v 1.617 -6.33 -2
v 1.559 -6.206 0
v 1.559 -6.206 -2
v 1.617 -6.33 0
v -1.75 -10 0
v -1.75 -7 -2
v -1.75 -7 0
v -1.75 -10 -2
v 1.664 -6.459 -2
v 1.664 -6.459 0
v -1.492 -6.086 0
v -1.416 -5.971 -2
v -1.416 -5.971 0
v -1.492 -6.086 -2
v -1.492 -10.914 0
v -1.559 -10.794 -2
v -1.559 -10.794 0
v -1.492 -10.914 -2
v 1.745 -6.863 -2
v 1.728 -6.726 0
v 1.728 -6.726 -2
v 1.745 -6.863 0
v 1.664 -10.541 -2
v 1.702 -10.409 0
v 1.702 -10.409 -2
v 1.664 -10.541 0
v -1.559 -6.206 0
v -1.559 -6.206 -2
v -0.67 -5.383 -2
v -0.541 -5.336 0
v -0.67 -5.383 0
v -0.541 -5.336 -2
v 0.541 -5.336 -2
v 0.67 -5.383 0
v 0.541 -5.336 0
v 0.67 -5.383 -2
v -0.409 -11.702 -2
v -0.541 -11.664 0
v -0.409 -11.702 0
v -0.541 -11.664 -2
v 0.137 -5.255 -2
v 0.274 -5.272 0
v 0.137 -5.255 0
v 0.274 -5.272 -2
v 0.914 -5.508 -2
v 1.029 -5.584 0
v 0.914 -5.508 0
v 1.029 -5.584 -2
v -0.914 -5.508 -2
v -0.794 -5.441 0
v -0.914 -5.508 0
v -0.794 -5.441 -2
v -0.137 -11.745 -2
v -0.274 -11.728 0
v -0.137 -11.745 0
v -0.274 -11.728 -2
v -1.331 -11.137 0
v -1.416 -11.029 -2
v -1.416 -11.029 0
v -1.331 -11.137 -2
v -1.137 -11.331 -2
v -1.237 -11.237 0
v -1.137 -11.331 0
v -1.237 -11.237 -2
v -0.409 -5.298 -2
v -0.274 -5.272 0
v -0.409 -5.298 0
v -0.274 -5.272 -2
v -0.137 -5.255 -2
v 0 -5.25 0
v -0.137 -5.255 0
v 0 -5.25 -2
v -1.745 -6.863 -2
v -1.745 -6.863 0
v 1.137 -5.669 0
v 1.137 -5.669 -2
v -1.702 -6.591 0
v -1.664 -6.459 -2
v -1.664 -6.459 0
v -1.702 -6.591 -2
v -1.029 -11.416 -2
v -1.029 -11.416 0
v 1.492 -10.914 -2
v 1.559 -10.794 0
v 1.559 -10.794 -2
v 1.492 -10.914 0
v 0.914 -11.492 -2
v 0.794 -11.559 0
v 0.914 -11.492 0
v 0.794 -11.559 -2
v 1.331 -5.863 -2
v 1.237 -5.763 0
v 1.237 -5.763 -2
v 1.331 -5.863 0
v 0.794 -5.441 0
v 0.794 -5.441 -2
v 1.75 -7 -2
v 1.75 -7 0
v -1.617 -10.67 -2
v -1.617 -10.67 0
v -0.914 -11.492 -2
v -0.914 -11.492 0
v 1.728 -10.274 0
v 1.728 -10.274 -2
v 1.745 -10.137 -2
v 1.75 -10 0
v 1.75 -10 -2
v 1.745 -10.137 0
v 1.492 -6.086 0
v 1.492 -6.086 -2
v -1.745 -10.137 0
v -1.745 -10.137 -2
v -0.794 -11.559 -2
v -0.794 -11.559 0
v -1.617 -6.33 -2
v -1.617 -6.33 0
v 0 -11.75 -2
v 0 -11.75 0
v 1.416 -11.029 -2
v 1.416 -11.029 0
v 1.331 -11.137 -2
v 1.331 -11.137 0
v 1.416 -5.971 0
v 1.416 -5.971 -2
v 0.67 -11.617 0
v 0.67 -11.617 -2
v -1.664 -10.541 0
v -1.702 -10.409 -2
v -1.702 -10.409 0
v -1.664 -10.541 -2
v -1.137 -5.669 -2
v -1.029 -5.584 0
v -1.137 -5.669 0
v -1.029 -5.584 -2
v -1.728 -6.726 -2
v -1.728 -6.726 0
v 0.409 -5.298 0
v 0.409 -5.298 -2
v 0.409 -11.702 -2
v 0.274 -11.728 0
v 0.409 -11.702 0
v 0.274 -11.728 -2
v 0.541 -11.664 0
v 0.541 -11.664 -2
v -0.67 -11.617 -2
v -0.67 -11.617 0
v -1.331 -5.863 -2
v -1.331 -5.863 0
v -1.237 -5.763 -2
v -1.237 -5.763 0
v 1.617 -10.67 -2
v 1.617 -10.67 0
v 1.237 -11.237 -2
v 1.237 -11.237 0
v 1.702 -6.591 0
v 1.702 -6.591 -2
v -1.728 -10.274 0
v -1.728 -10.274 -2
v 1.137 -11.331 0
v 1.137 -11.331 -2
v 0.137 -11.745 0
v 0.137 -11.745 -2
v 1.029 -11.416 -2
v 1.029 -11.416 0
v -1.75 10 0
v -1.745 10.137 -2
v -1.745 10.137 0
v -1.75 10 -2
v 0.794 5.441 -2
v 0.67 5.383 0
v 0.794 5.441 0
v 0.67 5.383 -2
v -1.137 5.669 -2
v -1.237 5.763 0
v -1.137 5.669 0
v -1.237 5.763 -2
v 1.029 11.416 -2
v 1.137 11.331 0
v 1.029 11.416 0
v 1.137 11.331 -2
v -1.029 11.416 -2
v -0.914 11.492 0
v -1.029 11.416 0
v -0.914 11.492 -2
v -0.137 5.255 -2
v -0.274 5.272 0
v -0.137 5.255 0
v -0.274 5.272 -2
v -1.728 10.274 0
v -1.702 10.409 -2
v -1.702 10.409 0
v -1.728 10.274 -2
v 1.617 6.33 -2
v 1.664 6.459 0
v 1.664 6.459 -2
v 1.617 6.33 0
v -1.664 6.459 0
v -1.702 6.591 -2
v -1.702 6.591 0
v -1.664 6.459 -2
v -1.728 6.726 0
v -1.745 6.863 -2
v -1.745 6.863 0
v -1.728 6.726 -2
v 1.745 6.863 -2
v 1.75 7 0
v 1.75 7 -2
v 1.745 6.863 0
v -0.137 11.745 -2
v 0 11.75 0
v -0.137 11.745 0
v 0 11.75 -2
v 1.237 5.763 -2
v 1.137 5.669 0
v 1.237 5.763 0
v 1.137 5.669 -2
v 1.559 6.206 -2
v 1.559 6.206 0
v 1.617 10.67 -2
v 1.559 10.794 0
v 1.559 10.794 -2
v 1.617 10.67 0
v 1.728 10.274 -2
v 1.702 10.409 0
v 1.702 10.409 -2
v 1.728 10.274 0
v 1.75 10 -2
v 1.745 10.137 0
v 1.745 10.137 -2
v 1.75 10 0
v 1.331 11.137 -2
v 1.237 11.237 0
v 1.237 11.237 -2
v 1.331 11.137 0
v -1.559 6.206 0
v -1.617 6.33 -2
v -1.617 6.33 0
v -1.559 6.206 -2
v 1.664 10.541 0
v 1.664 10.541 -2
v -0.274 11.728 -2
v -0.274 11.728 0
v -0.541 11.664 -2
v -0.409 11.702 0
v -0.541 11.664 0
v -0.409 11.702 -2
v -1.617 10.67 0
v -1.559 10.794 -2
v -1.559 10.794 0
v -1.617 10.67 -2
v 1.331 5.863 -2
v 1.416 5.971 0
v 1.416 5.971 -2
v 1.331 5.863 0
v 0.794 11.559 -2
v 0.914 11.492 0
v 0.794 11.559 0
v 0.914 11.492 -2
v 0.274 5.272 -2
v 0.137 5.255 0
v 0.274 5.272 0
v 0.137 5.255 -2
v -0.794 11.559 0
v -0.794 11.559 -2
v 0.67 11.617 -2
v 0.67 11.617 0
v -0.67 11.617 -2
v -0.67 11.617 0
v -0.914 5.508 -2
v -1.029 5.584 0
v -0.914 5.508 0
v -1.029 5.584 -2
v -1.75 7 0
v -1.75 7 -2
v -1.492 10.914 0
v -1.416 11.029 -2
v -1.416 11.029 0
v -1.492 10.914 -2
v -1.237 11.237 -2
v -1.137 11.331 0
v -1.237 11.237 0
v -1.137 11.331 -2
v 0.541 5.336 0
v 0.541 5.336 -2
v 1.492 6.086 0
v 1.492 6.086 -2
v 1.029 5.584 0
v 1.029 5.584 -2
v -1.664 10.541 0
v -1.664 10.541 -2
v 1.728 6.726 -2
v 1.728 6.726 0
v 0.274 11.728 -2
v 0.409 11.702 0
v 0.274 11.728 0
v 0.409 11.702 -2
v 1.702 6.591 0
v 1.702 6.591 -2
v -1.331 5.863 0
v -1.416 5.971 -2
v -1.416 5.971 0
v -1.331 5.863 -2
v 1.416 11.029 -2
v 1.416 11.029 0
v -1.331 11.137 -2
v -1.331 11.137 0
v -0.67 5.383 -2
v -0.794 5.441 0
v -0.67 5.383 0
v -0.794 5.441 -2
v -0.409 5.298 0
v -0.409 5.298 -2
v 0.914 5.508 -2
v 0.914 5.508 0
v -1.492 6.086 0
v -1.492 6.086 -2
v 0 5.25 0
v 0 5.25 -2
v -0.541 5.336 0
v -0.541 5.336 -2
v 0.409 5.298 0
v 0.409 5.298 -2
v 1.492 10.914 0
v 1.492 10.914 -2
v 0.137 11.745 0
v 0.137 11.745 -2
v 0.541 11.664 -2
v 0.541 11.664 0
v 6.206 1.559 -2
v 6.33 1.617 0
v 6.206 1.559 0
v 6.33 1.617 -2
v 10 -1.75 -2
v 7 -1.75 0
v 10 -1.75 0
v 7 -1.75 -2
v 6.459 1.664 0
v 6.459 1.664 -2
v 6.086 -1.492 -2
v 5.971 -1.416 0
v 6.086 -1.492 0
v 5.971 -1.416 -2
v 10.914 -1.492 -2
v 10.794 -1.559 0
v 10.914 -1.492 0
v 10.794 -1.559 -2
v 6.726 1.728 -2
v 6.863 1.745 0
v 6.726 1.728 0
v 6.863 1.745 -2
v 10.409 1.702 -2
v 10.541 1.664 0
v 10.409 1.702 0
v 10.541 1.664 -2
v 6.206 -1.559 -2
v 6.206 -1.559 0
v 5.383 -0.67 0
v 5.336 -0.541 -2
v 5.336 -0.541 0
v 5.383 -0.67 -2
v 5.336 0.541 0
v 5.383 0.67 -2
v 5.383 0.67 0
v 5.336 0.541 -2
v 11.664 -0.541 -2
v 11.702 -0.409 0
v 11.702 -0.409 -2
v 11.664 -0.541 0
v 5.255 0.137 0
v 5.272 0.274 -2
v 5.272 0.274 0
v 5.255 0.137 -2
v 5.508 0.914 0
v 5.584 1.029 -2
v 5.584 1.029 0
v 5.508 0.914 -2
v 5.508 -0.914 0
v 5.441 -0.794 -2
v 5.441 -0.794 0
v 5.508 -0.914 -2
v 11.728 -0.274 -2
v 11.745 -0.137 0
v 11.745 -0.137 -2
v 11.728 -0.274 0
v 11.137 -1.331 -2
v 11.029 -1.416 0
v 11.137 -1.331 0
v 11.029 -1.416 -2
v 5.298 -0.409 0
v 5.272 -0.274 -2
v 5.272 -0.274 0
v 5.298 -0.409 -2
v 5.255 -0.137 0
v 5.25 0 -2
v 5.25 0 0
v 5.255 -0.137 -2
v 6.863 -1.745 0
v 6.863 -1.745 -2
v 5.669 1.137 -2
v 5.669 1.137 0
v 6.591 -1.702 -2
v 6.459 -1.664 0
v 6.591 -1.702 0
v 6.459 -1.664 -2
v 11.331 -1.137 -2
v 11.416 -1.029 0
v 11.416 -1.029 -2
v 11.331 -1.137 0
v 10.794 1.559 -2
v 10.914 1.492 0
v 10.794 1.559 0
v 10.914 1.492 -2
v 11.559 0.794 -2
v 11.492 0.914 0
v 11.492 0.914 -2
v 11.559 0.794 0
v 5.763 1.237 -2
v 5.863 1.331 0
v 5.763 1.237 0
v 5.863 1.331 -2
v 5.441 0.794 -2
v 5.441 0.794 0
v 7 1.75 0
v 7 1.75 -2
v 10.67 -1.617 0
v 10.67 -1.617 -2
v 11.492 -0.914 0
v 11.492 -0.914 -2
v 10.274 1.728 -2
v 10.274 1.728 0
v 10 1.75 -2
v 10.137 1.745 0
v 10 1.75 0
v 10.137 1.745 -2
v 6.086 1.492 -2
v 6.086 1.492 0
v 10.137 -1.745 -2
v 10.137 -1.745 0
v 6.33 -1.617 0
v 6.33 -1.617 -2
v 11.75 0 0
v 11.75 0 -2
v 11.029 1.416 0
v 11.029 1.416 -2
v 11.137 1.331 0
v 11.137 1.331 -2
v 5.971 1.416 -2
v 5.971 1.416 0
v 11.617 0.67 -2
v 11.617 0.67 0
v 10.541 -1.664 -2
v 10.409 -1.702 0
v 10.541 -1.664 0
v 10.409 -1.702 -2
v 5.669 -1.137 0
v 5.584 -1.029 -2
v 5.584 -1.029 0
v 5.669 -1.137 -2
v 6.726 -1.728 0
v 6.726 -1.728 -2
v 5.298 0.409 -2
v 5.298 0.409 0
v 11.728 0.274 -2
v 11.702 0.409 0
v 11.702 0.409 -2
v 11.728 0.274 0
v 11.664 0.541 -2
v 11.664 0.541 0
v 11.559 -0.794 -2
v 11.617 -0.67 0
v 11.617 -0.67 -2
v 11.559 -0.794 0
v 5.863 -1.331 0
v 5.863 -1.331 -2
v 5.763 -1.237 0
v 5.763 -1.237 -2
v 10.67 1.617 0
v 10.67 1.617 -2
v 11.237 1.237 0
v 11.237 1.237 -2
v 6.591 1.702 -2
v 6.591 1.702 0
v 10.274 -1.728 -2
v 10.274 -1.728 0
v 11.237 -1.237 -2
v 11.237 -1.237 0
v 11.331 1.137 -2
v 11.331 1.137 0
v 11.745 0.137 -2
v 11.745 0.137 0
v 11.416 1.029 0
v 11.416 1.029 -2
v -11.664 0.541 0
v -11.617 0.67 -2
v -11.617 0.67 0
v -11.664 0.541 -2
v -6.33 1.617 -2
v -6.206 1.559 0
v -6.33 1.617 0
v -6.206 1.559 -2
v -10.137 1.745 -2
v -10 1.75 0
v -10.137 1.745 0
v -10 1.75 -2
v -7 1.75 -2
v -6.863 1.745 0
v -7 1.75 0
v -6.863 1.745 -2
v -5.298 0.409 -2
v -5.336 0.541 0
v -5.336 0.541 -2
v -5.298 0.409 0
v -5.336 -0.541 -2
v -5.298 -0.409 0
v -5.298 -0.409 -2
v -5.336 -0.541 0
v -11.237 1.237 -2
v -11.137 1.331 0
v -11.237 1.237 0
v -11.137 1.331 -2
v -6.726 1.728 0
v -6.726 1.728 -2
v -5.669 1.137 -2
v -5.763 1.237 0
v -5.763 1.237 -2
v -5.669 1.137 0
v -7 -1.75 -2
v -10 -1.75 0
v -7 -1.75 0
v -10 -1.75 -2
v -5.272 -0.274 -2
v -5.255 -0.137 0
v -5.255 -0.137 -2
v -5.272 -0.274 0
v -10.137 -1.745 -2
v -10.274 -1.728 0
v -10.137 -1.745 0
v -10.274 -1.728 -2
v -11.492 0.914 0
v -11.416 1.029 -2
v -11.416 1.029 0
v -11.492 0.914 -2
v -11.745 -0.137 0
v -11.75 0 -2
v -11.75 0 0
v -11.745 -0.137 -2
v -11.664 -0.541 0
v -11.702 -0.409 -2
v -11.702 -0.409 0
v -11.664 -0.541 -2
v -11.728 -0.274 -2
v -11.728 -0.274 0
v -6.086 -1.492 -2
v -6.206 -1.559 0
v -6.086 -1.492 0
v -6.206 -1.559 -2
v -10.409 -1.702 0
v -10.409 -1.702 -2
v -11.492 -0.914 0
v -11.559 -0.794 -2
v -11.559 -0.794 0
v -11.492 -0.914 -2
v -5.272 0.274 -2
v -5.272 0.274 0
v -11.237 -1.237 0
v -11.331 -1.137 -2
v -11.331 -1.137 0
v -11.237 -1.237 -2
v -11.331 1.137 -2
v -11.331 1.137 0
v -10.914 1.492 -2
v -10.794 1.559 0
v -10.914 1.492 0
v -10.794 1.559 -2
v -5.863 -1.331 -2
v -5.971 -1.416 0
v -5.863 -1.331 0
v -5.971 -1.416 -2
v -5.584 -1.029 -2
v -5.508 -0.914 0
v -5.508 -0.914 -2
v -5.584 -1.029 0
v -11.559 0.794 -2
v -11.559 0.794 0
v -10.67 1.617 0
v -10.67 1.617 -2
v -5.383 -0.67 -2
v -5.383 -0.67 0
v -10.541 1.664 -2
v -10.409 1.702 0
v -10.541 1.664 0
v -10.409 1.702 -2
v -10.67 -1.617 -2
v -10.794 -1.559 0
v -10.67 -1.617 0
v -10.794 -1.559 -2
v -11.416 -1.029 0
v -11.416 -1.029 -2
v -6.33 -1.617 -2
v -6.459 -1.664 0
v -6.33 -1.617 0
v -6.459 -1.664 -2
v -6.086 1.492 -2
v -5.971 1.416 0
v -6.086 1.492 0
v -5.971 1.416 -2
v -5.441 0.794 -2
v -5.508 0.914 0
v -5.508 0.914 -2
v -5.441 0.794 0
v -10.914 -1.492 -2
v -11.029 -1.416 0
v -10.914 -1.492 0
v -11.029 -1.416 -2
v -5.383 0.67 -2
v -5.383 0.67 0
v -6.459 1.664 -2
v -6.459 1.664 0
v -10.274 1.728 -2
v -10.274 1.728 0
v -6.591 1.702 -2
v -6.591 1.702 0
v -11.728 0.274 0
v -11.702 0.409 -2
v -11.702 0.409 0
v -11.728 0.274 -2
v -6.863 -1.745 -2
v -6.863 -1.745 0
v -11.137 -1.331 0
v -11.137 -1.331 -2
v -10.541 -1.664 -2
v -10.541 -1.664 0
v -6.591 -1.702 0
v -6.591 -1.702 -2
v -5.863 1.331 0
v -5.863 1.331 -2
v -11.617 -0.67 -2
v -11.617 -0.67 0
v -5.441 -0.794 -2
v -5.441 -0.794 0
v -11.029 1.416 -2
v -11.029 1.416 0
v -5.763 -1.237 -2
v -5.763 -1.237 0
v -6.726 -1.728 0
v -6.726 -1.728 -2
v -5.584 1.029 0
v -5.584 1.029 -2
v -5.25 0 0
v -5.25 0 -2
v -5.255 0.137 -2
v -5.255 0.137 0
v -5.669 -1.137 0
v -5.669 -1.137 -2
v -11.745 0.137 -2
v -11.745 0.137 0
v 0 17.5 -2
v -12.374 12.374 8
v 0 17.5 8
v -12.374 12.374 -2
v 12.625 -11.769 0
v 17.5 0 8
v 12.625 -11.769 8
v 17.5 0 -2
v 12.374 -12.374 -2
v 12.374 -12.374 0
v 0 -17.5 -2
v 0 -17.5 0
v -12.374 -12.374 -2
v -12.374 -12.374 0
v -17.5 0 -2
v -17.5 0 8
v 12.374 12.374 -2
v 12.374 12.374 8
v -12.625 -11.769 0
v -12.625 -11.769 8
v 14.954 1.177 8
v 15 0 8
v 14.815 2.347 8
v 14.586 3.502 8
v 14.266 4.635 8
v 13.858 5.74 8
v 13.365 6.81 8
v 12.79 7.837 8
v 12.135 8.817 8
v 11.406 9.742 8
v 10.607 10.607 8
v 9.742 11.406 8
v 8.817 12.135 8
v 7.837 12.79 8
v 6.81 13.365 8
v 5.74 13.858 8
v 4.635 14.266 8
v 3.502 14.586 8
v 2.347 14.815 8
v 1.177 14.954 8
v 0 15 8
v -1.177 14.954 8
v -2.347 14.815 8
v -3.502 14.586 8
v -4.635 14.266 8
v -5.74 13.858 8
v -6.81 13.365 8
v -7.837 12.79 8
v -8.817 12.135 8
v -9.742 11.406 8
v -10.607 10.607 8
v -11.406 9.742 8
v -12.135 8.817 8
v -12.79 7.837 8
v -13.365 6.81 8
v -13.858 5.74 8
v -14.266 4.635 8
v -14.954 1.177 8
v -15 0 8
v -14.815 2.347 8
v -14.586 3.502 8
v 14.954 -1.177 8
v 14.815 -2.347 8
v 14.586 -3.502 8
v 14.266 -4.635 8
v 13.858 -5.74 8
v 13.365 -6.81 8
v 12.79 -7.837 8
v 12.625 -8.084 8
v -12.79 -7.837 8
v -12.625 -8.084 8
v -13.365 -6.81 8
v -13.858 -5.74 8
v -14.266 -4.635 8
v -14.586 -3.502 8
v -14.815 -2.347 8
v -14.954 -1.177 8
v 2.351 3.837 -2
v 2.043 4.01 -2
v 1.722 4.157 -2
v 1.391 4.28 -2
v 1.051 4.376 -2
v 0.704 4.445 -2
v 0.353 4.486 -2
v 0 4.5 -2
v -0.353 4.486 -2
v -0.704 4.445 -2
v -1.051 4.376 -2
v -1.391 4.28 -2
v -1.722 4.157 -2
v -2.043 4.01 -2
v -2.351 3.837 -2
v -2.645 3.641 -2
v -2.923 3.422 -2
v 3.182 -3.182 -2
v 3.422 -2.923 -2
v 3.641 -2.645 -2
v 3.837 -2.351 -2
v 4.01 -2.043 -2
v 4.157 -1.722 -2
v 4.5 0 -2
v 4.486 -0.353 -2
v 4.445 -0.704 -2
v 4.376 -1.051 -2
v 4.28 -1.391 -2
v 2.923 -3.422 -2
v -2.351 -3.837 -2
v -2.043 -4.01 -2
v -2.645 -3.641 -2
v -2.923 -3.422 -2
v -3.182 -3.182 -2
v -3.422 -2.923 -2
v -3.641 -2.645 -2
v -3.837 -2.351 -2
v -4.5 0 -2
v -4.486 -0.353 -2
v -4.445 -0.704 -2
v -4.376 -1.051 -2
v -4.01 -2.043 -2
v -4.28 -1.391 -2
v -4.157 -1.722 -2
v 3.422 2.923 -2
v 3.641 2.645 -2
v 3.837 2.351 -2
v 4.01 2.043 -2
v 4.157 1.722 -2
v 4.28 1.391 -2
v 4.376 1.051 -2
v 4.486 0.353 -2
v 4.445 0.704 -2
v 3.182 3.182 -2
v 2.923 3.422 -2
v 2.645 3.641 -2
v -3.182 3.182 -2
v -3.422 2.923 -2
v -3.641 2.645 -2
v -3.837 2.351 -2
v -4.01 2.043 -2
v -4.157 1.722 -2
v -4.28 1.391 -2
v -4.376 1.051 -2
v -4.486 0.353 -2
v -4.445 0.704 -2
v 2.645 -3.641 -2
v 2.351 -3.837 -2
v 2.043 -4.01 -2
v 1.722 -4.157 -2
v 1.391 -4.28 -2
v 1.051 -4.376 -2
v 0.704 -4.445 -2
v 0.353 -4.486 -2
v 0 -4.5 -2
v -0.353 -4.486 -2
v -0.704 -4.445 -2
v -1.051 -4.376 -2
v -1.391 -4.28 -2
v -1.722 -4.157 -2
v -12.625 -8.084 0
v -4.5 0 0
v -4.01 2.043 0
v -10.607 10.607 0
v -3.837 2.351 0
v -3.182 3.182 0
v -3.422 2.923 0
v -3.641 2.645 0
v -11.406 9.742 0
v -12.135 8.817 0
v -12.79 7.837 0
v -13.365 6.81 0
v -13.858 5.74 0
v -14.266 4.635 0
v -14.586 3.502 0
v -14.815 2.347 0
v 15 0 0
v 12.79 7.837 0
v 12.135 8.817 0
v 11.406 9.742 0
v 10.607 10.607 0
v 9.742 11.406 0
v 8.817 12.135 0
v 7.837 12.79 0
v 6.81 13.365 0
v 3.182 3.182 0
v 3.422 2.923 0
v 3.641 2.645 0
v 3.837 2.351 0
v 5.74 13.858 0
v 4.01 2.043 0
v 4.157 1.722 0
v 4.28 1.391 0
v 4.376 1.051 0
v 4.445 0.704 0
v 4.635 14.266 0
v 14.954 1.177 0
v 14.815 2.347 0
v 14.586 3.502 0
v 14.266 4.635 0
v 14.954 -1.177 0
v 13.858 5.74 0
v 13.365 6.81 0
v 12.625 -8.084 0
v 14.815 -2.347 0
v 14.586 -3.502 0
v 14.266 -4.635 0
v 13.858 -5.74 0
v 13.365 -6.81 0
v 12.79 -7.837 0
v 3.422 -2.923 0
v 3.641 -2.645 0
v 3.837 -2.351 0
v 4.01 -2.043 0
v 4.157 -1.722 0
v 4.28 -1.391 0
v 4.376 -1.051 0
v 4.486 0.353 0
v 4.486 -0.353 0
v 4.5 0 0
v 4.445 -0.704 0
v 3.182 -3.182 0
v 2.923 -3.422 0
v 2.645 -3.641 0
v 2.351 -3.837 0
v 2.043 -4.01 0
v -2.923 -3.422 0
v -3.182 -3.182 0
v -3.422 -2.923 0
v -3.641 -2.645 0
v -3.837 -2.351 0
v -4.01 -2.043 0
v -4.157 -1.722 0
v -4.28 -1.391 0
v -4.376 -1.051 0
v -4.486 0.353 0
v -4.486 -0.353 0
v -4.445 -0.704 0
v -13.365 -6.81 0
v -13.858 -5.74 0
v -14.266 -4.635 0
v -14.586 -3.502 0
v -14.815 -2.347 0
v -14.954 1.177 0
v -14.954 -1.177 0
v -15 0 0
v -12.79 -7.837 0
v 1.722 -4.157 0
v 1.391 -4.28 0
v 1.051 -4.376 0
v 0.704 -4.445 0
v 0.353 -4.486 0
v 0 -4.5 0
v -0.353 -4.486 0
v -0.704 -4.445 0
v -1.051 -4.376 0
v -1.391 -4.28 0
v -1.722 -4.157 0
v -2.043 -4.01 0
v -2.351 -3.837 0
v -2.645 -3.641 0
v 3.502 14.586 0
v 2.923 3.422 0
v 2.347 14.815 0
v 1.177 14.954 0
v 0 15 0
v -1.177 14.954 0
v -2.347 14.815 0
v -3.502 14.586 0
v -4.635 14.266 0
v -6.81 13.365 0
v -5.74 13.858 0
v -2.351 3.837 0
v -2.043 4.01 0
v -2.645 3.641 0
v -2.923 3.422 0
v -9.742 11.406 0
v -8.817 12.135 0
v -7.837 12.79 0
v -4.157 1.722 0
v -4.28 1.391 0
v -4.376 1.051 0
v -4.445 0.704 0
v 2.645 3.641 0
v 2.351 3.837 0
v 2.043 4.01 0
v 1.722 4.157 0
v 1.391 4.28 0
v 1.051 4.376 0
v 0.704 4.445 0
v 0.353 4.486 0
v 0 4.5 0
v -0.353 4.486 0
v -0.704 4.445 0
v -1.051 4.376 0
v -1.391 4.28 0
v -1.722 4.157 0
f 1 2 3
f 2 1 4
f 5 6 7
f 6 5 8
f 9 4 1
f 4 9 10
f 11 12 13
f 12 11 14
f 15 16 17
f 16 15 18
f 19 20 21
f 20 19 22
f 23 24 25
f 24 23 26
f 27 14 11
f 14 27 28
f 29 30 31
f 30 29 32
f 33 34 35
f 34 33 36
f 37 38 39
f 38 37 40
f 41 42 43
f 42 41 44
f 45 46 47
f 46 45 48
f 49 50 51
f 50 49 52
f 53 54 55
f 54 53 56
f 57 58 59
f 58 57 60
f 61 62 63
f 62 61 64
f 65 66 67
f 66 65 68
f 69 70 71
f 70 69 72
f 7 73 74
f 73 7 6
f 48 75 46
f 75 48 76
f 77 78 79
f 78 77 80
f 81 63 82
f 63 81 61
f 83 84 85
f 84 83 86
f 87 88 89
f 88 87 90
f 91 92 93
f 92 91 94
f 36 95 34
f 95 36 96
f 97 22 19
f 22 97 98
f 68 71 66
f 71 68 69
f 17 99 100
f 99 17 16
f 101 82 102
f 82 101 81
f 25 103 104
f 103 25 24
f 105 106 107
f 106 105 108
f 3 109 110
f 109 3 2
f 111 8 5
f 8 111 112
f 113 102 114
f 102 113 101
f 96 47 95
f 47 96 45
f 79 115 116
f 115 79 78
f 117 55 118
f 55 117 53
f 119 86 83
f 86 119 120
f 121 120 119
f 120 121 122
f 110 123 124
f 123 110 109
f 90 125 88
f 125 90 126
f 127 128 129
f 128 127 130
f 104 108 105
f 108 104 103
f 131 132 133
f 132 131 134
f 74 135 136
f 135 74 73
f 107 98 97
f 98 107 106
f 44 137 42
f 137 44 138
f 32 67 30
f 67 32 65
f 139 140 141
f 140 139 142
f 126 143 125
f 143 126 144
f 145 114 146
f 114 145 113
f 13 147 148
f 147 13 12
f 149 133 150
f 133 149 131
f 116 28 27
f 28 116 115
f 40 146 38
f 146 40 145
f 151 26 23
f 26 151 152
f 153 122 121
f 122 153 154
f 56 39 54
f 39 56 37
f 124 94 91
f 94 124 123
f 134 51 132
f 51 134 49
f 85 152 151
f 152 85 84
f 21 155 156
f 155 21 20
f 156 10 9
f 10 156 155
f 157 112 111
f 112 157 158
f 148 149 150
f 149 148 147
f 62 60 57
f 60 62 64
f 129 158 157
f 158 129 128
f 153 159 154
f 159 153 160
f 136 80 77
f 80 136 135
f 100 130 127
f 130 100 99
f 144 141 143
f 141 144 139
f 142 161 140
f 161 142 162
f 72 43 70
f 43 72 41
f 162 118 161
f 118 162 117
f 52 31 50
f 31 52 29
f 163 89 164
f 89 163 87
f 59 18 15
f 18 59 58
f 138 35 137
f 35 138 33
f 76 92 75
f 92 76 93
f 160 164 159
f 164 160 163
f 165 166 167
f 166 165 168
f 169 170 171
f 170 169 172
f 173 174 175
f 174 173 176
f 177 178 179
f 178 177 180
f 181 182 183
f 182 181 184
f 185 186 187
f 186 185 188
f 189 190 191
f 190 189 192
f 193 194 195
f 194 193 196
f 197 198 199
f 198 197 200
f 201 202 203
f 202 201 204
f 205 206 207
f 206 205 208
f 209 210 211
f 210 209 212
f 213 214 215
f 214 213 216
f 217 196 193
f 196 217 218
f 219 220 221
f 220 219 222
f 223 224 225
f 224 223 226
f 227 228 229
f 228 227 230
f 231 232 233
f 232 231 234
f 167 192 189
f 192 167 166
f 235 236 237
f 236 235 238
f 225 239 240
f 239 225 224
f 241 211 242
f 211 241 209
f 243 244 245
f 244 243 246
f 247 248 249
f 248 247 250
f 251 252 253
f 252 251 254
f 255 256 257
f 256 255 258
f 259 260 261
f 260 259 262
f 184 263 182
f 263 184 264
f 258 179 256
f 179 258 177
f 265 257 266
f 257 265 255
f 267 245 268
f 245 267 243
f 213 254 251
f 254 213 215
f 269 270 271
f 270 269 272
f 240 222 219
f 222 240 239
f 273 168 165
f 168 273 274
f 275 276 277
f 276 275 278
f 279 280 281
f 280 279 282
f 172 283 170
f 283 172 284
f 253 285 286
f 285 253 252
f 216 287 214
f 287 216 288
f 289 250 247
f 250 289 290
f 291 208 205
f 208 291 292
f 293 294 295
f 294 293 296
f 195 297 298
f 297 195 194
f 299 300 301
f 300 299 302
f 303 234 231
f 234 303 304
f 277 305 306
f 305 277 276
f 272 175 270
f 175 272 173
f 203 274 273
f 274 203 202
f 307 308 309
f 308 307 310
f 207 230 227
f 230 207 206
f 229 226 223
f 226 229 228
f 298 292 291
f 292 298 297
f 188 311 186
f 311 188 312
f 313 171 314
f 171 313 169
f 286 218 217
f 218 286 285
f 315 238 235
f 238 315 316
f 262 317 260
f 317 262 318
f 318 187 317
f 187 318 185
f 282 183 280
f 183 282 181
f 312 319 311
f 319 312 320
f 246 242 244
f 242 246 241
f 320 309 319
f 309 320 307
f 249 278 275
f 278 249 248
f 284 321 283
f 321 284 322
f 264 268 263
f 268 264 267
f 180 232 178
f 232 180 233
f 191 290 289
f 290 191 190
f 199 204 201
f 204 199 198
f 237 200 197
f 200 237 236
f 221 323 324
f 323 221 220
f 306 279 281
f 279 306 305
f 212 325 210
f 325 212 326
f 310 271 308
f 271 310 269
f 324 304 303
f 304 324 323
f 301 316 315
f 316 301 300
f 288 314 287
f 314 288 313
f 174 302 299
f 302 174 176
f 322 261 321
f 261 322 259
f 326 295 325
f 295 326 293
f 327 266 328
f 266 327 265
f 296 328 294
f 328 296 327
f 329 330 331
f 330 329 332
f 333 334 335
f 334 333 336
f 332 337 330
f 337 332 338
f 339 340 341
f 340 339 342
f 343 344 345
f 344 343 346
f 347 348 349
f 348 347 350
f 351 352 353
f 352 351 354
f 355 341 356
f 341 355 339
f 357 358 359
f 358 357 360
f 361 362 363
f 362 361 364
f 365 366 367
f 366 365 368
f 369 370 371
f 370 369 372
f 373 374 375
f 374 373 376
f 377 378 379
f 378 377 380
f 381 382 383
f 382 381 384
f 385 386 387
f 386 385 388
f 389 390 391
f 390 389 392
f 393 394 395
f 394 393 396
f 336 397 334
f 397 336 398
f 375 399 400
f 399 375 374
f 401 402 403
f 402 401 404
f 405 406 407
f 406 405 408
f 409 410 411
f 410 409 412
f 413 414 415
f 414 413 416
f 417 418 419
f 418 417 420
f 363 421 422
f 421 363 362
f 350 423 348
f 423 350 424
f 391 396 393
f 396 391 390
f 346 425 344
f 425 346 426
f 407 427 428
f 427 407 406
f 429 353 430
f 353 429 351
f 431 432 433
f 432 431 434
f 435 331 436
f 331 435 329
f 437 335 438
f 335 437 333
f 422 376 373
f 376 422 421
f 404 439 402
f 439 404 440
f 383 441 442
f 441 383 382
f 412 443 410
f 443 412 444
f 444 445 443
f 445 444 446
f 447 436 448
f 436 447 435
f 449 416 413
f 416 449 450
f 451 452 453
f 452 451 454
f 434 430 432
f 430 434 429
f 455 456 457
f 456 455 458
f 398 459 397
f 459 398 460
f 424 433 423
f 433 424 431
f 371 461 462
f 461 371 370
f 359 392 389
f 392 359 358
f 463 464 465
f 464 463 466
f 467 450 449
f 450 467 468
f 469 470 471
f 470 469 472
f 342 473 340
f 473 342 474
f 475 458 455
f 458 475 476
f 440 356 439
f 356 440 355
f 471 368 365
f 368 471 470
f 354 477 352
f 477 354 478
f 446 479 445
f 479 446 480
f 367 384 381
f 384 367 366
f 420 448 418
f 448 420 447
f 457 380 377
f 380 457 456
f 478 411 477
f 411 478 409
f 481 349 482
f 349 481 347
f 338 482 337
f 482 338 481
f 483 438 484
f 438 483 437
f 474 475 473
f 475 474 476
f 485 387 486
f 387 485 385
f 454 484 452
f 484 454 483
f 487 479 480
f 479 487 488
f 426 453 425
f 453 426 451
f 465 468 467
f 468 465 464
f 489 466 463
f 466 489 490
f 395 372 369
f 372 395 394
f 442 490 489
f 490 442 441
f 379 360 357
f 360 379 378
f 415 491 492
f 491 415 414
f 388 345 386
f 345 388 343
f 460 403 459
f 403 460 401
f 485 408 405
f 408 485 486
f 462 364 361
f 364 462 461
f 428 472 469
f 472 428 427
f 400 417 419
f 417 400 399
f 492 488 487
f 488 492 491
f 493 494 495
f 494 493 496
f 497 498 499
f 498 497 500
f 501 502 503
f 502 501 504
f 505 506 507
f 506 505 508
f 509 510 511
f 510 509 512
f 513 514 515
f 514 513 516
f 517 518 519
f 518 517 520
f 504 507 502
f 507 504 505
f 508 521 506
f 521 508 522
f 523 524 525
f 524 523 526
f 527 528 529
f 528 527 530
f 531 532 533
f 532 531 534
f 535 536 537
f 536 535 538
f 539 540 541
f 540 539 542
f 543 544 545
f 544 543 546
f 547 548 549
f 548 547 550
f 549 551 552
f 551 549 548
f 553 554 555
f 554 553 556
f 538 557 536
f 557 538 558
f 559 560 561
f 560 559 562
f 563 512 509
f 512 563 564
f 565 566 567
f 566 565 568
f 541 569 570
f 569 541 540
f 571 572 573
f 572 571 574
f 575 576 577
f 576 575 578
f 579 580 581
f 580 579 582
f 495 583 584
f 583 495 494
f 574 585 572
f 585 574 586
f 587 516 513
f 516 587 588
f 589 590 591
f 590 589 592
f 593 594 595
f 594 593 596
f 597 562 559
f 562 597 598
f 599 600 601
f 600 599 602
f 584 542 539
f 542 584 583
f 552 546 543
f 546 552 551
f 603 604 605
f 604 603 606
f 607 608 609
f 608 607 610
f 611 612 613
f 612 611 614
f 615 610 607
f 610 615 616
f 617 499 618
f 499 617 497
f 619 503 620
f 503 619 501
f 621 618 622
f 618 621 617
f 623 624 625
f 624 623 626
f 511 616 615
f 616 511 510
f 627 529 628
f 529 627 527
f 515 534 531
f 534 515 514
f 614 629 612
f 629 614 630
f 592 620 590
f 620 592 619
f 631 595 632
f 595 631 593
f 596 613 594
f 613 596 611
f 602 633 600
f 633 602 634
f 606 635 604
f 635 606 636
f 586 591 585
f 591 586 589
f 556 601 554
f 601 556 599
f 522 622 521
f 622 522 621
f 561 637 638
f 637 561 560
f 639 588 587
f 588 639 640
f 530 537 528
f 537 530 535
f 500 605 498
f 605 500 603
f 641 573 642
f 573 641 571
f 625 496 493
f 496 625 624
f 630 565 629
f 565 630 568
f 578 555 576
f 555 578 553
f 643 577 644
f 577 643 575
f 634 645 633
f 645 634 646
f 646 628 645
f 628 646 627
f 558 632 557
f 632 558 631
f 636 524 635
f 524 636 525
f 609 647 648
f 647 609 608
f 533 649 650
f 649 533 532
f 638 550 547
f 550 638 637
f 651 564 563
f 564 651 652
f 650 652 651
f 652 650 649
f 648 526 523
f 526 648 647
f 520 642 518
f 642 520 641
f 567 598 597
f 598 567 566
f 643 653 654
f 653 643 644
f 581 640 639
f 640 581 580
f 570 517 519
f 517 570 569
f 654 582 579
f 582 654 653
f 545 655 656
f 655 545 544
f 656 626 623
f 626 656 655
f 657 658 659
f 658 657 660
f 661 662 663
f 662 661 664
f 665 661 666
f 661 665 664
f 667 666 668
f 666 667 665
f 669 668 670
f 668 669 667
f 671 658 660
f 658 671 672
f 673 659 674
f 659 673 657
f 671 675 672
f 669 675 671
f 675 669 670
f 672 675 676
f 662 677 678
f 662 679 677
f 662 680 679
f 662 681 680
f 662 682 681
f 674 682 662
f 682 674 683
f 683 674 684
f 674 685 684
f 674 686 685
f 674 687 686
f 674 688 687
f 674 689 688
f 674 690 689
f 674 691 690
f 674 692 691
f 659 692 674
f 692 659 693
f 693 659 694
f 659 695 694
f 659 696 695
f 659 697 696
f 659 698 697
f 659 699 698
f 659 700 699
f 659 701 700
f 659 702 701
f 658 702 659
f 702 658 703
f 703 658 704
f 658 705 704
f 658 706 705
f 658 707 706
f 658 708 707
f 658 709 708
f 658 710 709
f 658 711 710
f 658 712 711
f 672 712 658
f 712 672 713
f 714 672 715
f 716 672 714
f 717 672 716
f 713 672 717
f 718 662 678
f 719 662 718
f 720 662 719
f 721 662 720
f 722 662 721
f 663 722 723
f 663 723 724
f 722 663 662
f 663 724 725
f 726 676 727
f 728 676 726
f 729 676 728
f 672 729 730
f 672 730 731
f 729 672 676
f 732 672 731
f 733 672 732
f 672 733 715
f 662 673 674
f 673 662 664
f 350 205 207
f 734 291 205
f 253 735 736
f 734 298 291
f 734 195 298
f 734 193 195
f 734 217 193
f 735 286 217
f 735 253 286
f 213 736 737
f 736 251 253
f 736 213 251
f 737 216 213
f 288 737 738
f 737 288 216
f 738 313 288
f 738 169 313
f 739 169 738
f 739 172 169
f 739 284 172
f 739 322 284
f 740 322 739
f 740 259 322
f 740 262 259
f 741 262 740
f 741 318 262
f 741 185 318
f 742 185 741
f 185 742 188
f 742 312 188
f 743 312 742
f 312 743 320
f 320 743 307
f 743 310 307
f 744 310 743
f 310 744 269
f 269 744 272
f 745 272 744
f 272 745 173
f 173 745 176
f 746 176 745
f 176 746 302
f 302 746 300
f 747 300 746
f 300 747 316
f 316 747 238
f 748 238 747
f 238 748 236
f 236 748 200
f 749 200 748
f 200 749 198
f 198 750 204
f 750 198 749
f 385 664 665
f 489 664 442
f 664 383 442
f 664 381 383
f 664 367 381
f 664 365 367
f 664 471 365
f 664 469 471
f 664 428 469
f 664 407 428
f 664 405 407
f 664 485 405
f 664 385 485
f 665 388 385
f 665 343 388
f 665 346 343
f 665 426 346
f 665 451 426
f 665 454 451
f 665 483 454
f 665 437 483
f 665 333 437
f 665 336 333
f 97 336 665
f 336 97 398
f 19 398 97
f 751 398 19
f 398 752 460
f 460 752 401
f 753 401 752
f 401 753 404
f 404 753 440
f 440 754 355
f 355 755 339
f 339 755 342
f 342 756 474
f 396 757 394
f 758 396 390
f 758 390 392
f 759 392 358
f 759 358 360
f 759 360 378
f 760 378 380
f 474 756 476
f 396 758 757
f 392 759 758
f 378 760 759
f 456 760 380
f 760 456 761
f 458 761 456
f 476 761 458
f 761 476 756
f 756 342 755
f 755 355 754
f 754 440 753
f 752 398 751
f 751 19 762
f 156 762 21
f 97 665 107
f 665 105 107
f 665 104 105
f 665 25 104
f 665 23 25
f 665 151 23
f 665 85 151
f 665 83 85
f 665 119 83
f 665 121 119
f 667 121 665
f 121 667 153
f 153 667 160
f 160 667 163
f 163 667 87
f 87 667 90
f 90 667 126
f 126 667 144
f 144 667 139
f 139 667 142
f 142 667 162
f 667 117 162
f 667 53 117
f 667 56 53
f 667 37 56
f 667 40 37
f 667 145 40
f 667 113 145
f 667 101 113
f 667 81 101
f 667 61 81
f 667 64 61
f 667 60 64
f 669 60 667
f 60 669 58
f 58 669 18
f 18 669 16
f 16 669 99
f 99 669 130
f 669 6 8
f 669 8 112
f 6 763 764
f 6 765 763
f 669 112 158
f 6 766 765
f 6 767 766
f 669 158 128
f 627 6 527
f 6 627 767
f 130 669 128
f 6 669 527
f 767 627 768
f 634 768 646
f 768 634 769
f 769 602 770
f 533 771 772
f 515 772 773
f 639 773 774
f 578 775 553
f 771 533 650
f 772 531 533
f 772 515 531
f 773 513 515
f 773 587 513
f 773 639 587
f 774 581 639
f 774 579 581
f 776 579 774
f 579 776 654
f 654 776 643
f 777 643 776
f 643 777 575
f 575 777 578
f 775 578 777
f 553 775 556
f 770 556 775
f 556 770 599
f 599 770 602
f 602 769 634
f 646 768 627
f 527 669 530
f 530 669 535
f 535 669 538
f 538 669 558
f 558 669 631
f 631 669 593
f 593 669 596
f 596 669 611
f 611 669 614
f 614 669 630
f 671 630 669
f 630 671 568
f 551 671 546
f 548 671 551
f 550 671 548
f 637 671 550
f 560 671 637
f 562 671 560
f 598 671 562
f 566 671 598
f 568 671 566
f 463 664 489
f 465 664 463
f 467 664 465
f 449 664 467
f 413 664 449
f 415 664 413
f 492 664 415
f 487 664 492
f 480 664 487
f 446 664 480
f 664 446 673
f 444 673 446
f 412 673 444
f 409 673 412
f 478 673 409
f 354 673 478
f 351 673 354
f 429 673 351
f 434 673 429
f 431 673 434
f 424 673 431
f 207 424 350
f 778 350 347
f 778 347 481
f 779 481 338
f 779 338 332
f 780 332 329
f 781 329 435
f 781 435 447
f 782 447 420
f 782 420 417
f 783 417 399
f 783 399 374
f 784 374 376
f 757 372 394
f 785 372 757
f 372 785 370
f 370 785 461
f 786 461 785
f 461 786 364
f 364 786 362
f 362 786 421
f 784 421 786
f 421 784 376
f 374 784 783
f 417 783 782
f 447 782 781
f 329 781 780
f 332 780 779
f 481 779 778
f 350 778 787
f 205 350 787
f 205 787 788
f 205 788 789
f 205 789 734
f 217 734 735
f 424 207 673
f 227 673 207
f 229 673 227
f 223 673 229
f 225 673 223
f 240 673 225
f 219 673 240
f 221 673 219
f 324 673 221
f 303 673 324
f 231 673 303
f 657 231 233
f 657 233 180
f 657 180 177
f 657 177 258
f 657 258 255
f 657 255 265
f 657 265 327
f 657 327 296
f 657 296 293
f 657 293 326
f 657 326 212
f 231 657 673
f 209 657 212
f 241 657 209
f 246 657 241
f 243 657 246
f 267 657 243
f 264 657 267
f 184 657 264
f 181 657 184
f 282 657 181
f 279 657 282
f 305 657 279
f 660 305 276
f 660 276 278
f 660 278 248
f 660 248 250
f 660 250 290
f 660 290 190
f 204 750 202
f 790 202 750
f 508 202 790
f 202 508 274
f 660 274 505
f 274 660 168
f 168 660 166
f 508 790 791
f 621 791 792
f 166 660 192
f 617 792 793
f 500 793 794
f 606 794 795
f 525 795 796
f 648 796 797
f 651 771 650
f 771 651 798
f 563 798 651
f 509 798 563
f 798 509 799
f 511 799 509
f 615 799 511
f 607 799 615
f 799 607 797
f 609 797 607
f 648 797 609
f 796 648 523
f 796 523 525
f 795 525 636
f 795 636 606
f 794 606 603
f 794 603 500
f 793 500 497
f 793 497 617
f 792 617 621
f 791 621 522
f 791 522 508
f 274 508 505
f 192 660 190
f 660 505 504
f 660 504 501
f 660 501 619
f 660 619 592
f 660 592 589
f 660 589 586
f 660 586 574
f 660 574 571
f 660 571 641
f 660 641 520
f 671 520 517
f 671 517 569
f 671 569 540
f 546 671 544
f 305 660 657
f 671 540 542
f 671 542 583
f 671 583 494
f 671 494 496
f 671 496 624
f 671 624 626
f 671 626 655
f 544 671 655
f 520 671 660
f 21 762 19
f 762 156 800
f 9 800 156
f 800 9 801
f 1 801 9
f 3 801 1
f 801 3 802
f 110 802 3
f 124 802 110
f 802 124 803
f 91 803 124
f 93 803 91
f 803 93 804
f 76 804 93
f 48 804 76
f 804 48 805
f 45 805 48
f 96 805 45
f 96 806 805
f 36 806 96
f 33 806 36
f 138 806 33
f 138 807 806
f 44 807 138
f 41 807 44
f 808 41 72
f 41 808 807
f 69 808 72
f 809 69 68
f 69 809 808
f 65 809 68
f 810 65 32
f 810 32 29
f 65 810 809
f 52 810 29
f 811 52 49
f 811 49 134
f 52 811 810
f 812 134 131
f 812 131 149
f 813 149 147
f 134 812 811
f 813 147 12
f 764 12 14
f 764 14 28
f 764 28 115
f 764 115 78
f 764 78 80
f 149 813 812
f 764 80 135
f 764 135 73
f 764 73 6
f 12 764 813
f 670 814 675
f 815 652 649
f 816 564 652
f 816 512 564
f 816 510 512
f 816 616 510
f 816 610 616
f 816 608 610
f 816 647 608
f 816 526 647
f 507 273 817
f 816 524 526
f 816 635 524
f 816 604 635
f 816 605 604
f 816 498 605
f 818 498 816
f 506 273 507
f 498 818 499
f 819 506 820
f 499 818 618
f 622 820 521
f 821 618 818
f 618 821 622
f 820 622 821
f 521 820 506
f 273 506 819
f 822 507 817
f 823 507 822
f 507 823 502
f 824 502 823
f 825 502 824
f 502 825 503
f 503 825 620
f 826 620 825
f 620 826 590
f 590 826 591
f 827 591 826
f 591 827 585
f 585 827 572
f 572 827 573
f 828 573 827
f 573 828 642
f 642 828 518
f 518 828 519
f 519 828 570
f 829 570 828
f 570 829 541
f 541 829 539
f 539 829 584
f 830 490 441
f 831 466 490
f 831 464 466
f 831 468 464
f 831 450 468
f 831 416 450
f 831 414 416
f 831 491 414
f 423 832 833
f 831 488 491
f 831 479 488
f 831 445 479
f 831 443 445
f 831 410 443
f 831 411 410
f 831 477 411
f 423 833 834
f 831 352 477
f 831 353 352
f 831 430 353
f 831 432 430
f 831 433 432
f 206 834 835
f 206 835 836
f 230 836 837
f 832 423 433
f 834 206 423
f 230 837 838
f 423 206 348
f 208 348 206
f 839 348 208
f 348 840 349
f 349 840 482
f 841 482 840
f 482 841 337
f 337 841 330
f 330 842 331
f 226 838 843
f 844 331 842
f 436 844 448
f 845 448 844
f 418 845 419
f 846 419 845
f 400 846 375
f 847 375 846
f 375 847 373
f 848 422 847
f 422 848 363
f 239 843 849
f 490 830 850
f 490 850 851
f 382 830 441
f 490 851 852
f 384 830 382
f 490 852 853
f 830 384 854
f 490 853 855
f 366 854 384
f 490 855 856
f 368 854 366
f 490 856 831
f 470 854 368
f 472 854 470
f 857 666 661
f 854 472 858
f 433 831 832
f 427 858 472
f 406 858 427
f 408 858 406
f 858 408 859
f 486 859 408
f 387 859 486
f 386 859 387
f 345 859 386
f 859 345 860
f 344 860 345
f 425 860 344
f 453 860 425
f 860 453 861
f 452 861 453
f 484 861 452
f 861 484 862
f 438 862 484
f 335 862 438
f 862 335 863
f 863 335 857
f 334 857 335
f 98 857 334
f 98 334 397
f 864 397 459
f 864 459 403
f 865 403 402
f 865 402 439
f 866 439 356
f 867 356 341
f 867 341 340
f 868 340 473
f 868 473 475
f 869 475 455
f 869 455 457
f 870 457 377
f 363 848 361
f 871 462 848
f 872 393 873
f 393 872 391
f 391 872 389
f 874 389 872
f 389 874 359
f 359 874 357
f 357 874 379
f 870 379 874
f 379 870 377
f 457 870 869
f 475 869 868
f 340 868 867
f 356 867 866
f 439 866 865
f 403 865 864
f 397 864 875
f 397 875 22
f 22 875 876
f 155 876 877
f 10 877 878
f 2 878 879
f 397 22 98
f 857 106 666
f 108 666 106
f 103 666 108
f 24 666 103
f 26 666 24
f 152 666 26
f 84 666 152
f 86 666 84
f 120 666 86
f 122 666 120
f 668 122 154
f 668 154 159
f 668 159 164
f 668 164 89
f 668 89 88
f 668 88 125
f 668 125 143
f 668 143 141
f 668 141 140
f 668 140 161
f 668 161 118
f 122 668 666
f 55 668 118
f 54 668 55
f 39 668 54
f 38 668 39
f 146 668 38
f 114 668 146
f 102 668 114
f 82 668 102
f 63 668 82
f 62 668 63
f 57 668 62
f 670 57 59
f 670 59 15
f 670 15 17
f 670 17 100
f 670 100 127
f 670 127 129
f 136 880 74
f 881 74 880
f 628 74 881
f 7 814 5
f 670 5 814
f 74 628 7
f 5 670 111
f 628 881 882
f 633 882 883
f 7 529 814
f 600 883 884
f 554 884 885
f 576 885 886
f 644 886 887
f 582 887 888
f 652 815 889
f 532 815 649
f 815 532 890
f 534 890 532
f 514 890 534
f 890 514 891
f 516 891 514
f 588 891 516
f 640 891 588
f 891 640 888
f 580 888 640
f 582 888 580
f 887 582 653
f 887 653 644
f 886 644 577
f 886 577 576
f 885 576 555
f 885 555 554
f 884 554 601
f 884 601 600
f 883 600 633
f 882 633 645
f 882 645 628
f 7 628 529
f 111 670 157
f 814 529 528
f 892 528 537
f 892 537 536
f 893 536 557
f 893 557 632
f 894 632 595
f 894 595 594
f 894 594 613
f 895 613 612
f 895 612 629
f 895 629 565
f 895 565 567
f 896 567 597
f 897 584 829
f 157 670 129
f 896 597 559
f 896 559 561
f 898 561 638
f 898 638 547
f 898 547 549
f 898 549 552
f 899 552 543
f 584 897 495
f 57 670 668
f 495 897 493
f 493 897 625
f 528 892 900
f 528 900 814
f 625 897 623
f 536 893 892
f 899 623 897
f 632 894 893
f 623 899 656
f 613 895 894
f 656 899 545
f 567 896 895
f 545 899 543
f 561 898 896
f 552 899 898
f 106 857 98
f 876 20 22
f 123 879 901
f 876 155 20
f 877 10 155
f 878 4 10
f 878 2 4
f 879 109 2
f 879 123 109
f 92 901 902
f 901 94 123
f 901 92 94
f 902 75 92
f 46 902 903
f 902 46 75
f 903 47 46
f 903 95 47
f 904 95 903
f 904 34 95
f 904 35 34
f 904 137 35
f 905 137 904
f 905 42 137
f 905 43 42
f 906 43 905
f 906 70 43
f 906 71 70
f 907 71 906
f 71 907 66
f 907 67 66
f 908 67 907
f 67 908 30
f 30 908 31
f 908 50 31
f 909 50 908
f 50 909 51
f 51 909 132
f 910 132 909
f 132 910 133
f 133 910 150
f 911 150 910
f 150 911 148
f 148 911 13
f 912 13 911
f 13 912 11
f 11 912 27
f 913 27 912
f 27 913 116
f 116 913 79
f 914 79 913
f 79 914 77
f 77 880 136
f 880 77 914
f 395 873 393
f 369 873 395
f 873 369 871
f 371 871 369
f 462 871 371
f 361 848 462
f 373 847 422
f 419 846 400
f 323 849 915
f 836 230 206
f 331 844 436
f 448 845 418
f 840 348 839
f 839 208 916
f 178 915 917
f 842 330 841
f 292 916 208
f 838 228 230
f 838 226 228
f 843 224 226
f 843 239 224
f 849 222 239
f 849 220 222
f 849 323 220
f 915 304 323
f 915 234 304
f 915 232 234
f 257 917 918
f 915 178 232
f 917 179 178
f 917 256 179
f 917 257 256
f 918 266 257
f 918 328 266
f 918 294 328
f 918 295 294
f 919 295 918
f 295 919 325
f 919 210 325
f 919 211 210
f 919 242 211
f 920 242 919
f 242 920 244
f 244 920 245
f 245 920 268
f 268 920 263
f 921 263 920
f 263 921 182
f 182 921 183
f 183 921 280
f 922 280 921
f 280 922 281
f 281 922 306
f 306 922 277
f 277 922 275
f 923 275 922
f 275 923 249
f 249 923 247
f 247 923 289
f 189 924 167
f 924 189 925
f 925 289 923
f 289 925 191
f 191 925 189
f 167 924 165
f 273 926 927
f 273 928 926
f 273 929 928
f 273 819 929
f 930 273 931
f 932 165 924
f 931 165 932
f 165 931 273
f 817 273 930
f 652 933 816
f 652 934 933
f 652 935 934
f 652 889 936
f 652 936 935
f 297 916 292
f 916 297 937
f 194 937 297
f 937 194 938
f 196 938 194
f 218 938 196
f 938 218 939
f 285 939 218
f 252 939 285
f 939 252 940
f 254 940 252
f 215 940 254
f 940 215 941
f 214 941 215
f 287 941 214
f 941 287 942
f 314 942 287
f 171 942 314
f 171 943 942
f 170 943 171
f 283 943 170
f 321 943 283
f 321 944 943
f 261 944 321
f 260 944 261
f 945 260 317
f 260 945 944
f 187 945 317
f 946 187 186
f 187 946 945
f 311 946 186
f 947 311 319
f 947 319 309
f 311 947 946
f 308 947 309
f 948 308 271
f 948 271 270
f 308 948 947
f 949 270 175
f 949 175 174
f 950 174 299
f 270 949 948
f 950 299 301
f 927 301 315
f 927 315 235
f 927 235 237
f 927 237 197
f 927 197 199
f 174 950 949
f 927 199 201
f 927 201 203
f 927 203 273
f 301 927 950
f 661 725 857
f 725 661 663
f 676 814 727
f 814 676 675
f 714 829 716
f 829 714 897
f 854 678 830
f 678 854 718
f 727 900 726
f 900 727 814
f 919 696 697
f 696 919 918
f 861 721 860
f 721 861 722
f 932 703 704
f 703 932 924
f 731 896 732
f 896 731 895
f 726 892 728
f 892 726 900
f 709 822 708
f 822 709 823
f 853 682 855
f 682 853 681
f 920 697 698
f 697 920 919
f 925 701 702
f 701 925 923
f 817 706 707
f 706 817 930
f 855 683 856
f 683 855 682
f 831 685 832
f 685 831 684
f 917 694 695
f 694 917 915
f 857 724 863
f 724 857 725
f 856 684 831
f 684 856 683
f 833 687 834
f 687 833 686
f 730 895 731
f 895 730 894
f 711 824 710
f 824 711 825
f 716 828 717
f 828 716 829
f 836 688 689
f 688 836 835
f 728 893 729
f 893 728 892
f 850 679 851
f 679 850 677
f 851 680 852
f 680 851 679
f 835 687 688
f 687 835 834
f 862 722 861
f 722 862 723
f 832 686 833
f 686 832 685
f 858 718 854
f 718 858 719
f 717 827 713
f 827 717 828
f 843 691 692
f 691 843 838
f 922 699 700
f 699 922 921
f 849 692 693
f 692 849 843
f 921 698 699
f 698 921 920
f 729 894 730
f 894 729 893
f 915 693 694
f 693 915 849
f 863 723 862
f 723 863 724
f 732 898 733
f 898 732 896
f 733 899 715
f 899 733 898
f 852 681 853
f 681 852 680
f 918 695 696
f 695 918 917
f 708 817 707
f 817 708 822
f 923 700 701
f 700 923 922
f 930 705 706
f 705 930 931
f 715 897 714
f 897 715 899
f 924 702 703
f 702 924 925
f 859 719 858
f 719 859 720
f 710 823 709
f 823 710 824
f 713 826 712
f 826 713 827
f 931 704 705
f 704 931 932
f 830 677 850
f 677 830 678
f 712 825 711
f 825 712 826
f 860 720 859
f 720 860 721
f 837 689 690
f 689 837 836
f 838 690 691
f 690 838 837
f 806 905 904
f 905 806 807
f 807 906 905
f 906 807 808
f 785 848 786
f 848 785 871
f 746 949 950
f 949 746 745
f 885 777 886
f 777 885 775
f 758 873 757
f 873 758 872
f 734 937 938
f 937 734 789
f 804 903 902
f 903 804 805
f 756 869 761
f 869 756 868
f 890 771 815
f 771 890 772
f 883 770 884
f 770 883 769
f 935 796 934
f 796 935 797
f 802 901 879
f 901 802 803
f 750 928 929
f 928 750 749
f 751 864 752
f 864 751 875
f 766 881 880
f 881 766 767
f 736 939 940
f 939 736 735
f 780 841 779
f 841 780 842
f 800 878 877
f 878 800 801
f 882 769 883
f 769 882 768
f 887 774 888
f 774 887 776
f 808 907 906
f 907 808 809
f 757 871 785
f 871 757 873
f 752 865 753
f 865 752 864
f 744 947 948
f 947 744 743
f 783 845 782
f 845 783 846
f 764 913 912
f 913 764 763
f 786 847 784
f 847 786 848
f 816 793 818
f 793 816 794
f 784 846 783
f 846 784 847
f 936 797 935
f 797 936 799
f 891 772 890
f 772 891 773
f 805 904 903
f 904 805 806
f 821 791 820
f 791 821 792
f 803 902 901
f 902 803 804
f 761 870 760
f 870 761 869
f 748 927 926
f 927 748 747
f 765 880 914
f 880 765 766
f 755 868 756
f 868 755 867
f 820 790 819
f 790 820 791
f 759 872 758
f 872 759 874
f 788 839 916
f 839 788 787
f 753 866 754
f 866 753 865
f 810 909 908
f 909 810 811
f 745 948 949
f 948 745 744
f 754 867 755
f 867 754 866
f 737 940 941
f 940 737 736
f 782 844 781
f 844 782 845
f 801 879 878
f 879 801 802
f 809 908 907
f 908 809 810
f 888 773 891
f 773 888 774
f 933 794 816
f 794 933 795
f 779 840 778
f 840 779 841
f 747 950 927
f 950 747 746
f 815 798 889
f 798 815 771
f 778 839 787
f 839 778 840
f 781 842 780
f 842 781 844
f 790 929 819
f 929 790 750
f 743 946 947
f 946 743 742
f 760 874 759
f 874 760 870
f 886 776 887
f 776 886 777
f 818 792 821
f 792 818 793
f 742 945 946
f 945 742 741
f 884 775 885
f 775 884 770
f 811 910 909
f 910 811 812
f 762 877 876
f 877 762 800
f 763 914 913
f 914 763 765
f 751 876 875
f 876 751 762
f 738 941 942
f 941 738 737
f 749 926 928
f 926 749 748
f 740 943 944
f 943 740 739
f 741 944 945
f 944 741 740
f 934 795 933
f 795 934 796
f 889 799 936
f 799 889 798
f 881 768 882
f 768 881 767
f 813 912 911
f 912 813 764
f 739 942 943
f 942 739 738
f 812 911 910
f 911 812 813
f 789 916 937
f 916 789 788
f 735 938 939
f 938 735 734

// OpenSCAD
/*
Customisable Motor Protection for Quadcopter

    - by Harlo
    - 16/05/2016
    
    **Standard variables are based on an Emax Nighthawk 250**
*/


//Fixing Screws Diameter
screw_dia = 3.5; //[0:0.25:8]
//Distance Between Screw Centers
screw_seperation = 17; //[0:0.25:50]
//Screw Slide Distance
screw_slide = 3; //[0:0.25:10]
//Rotate the fixings (degrees)
screw_rotation = 0; //[0:1:90]
//Motor Shaft Diameter (add tolerance)
shaft_dia = 9; //[0:0.25:15]
//Arm Diameter (of mount)
arm_dia = 30; //[5:0.25:80]
//Arm Width
arm_width = 25.25; //[3:0.25:80]
//General Smoothness 
resolution = 80; //[20:1:180]
//Outside Diameter
protector_dia = 35; //[20:0.25:120]
//Outer Shape/Smoothness
protector_res = 8; //[8:1:180]
//Protector Height (Total Z)
protector_height = 10; //[1:0.1:60]
//Protector Lower Thickness
protector_bottom_thickness = 2; //[0.5:0.1:10]
//Rotate (for viewing while editing)
turn = -90; //[0:15:360]

//Internal Variables
arm_length = arm_dia*3;
screw_height = 20 * 1;
arm_thickness = 20 * 1;
shaft_height = 20 * 1;

//Render
rotate([0,0,turn]){
    protector_with_cuts();
}

//Modules

module protector_with_cuts(){
    difference(){
        protector();
        cut_arm();
        cut_base();
        cut_screws();
        cut_shaft();        
    }
}

module protector(){
    translate([0,0,protector_height/2 - protector_bottom_thickness]){
        cylinder(h = protector_height, d = protector_dia, center = true, $fn = protector_res);
    }
}


//CUTTING Modules
module cut_shaft(){
    cylinder(h = shaft_height, d = shaft_dia, center = true, $fn = resolution);
}

module cut_screws(){
    rotate([0,0,screw_rotation]){
        screw_placed();
        rotate([0,0,90]){
            screw_placed();
        }
    }
}

module screw_placed(){
    translate([screw_seperation/2,0,0]){
        screw_slide();
    }
    
    translate([-screw_seperation/2,0,0]){
        screw_slide();
    }
}

module screw_slide(){
    hull(){
        translate([screw_slide/2,0,0]){
            screw(screw_height, screw_dia);
        }
        translate([-screw_slide/2,0,0]){
            screw(screw_height, screw_dia);
        }
    }
}

module screw(height, diameter){
    cylinder(h = height, d = diameter, $fn = resolution, center = true);
}

module cut_base(){
    translate([0,0,arm_thickness/2]){
        cylinder(h = arm_thickness, d = arm_dia, $fn = resolution, center = true);
    }
}

module cut_arm(){
    translate([arm_length/2,0,arm_thickness/2]){
        cube([arm_length, arm_width, arm_thickness], center = true);
    }
}
